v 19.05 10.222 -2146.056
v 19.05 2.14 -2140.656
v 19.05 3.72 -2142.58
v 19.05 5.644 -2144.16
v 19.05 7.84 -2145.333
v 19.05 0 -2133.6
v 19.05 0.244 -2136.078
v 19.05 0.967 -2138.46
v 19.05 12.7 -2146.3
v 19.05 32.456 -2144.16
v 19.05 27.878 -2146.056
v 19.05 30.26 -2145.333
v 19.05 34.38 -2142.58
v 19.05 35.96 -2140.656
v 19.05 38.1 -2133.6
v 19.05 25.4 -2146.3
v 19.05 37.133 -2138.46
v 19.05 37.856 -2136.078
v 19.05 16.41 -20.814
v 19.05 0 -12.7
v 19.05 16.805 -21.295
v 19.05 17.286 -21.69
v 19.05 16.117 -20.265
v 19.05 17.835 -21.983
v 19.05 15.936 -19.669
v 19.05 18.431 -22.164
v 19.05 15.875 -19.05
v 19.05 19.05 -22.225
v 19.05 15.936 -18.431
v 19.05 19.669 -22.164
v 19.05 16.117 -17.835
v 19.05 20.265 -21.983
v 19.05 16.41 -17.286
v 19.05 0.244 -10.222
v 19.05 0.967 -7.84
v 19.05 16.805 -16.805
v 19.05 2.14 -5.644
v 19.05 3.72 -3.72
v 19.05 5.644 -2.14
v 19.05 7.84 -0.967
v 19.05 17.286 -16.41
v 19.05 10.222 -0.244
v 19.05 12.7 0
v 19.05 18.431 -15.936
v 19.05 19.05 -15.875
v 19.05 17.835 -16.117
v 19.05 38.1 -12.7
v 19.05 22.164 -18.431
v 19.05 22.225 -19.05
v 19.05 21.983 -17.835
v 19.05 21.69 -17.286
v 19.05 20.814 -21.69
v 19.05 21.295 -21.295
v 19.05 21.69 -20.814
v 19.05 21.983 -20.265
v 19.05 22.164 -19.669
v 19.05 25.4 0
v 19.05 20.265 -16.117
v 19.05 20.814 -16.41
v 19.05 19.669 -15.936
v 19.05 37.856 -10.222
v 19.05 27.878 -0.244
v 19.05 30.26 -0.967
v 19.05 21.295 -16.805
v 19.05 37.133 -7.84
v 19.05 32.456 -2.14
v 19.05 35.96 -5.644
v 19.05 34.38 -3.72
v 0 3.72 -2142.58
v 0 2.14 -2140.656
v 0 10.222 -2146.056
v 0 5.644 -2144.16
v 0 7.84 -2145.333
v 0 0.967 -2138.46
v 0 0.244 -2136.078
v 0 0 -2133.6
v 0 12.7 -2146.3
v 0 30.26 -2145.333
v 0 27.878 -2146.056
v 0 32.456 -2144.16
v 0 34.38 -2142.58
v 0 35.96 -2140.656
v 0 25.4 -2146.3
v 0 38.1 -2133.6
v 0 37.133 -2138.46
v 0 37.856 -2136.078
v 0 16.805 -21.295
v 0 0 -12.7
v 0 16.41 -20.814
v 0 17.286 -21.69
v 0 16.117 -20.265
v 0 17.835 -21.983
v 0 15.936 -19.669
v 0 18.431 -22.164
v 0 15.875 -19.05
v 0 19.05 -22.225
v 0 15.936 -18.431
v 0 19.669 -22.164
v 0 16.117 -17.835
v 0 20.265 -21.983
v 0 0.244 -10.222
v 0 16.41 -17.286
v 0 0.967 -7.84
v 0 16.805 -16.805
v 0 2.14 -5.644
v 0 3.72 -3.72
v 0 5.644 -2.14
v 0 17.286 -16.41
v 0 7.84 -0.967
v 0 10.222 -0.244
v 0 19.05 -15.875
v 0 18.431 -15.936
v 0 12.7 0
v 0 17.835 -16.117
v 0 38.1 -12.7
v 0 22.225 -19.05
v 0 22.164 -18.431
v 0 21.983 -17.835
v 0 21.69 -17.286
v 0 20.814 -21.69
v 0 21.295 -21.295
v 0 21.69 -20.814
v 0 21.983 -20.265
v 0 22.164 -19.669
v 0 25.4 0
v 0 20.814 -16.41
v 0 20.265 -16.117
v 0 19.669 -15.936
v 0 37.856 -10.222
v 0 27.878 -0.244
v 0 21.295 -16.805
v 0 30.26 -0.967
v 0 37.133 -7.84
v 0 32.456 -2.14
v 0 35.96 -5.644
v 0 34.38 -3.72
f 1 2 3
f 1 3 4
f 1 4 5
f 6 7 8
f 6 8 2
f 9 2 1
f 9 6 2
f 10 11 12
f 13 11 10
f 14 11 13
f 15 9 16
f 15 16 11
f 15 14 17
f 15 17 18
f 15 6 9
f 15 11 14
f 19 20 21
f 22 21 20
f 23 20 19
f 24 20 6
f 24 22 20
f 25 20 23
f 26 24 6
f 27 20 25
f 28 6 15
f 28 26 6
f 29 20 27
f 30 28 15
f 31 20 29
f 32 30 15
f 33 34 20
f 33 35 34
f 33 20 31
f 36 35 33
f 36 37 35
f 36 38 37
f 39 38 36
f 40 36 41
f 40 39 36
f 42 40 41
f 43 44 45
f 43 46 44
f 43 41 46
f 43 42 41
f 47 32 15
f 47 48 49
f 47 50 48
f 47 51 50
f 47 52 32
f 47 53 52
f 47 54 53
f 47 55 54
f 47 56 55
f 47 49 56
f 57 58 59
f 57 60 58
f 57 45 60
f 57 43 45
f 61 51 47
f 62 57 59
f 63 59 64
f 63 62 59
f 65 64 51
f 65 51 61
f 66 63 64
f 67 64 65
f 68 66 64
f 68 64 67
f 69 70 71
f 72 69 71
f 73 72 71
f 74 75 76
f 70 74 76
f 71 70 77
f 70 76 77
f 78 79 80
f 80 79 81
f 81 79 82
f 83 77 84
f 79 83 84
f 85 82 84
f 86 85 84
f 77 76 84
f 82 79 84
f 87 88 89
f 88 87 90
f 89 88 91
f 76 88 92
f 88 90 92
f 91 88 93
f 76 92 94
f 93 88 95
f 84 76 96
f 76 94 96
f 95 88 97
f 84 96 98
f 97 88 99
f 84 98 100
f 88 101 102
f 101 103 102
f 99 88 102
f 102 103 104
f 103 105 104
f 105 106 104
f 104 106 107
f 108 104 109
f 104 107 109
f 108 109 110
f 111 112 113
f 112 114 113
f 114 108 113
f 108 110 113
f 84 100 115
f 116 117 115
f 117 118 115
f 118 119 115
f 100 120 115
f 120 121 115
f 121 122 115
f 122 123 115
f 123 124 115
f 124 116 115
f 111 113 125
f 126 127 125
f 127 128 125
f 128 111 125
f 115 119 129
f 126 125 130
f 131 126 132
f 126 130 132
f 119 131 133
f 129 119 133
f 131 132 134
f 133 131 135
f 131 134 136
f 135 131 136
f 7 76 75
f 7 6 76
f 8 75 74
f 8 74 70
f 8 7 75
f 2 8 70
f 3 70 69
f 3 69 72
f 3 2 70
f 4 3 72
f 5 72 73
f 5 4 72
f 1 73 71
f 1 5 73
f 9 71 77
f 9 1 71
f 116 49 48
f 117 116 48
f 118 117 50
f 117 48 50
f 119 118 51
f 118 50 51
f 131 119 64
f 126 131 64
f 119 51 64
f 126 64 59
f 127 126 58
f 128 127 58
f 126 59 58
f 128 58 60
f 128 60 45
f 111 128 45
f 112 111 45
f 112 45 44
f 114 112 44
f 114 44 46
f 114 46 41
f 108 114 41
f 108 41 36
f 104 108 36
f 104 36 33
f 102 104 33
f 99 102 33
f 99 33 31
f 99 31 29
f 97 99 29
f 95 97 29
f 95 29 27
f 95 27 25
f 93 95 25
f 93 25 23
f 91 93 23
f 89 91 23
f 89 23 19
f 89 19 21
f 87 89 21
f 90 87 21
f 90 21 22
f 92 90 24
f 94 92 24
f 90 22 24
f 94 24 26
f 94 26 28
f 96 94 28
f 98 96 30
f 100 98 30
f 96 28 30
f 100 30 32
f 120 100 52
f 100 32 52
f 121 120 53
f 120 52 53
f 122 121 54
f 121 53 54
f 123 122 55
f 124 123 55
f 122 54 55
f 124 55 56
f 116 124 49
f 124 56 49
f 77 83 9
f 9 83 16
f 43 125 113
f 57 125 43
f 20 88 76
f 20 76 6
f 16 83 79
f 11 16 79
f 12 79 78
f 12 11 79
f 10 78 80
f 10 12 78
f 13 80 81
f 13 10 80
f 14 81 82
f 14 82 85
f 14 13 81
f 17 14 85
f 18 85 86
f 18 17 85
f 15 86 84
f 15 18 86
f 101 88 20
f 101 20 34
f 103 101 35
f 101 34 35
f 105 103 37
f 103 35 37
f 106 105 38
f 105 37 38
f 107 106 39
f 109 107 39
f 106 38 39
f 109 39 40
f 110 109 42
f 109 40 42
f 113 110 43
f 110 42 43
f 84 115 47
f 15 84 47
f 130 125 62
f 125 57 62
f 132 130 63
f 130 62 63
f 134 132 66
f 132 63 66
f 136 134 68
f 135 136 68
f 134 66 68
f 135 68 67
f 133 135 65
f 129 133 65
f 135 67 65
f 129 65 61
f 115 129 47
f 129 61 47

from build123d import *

# Parameters (mm, degrees)
F0_W     = 19.05
F0_H     = 38.1
F1_DEPTH = 2146.3
F2_R     = 3.175
F3_DEPTH = 19.051
F4_R     = 12.7


with BuildPart() as f1:
    # F0 (on Top) → F1 (new body)
    with BuildSketch(Plane.XY):
        with Locations((9.525, 19.05)):
            Rectangle(F0_W, F0_H)
    extrude(amount=-F1_DEPTH)

    # F2 (on face) → F3 (cut, through all)
    with BuildSketch(Plane.YZ.offset(19.05)):
        with Locations((19.05, -19.05)):
            Circle(F2_R)
    extrude(amount=-F3_DEPTH, mode=Mode.SUBTRACT)

    # F4
    f4_edges = [f1.edges().sort_by_distance(p)[0] for p in [
        (9.525, 0, 0),
        (9.525, 38.1, 0),
        (9.525, 0, -2146.3),
        (9.525, 38.1, -2146.3),
    ]]
    fillet(f4_edges, radius=F4_R)


solid = f1.part
